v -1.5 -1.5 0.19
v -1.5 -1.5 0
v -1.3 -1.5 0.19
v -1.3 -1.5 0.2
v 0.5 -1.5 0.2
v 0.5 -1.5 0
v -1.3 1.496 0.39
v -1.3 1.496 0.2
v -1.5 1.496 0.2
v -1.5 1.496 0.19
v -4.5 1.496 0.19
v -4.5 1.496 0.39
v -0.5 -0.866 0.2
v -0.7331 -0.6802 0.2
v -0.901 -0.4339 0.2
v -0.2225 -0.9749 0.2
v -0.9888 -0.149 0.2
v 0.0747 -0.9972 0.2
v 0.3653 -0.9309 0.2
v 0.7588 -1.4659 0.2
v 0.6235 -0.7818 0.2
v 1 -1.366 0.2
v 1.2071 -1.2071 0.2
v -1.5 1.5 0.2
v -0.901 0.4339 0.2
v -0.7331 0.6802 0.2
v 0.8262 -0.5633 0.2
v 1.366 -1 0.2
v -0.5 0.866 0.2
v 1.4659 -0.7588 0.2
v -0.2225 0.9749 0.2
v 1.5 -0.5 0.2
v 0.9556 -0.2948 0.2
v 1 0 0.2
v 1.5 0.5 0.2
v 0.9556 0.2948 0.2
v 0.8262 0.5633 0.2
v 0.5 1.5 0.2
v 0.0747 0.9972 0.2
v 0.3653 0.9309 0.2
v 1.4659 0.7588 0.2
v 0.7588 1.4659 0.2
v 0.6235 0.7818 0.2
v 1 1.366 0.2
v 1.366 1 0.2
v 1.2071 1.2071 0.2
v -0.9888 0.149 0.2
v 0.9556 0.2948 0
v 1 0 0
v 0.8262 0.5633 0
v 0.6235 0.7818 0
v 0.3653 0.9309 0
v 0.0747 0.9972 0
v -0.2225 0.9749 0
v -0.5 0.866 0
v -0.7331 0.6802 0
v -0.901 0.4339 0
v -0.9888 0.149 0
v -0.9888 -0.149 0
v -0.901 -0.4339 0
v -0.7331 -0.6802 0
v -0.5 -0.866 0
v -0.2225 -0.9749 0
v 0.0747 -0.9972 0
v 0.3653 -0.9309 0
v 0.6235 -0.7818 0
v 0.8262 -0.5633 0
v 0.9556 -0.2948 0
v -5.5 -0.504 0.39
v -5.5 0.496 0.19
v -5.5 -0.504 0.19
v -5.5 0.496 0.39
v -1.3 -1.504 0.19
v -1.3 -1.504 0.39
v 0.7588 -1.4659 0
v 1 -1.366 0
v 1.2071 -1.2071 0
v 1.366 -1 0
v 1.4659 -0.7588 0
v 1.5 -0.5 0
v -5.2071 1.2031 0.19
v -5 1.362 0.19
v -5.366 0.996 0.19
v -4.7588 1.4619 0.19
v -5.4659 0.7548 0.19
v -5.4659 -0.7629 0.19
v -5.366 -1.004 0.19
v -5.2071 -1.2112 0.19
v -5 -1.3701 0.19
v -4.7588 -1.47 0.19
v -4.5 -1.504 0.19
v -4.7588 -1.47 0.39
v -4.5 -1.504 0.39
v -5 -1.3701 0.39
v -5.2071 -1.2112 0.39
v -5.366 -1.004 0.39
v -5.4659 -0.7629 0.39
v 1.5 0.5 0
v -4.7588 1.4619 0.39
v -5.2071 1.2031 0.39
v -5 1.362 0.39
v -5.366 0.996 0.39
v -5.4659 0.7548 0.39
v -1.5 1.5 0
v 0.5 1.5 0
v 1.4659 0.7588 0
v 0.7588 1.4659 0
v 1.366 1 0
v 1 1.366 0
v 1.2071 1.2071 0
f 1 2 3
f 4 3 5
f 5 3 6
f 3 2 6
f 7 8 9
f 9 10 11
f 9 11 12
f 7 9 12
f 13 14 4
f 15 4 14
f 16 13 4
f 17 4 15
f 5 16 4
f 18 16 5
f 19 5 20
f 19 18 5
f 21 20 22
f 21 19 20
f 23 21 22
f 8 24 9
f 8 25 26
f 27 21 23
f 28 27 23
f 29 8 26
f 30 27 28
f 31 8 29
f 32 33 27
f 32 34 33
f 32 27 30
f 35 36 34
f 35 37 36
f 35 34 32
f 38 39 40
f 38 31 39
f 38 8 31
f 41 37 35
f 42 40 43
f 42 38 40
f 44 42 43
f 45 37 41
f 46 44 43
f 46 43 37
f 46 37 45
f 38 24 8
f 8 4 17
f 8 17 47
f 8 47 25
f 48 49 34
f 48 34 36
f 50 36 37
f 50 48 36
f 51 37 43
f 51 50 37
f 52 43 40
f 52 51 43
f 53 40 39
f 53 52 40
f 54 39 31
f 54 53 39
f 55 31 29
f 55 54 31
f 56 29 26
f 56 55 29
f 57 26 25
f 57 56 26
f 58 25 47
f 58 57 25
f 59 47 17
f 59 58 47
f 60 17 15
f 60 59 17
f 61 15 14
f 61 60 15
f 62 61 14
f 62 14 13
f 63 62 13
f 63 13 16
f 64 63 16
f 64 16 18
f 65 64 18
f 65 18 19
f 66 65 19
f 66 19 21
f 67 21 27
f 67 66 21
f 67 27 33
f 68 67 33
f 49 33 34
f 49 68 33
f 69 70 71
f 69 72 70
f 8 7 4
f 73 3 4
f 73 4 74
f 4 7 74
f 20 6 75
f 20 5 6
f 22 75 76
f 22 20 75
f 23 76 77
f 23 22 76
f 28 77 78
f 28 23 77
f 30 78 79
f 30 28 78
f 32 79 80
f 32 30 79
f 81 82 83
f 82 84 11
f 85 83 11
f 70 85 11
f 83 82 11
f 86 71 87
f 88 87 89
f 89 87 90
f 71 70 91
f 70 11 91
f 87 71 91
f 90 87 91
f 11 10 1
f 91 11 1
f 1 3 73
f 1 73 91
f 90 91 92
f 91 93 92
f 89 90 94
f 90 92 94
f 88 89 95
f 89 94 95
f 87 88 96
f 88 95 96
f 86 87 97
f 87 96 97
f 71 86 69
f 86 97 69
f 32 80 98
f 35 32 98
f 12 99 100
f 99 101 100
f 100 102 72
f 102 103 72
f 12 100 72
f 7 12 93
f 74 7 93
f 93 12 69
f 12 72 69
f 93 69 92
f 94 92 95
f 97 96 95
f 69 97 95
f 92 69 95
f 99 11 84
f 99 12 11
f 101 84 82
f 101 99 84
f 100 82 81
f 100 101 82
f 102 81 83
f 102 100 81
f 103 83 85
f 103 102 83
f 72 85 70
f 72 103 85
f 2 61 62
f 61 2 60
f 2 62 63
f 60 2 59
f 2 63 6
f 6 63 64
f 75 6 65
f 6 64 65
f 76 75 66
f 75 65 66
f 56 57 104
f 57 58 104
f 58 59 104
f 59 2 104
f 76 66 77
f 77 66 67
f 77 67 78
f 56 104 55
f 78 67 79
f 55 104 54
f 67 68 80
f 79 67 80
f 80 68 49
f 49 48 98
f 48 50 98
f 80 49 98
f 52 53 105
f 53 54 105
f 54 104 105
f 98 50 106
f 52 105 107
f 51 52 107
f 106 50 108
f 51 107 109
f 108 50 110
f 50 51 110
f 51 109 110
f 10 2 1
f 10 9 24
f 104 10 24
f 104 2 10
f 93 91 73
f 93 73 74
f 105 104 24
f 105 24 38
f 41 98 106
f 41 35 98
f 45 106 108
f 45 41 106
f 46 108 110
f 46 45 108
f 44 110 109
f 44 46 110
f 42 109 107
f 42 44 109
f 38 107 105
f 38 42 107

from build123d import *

# Parameters (mm, degrees)
SKETCH_W          = 3
SKETCH_H          = 3
SKETCH_R          = 1
PAD_DEPTH         = 0.2
SKETCH001_W       = 3
SKETCH001_H       = 0.2
PAD001_DEPTH      = 4
PAD001_DEPTH_BACK = 0.2
FILLET_R          = 1


with BuildPart() as part:
    # Sketch → Pad (new body)
    with BuildSketch(Plane.XY):
        Rectangle(SKETCH_W, SKETCH_H)
        Circle(SKETCH_R, mode=Mode.SUBTRACT)
    extrude(amount=PAD_DEPTH)

    # Sketch001 (on Face4 of Pad) → Pad001 (join, two sides)
    with BuildSketch(Plane(origin=(-1.5, 0, 0), x_dir=(0, -1, 0), z_dir=(-1, 0, 0))) as pad001_sk:
        with Locations((0.004044, 0.29)):
            Rectangle(SKETCH001_W, SKETCH001_H)
    extrude(amount=PAD001_DEPTH)
    extrude(pad001_sk.sketch, amount=-PAD001_DEPTH_BACK)

    # Fillet
    fillet_edges = [part.edges().sort_by_distance(p)[0] for p in [
        (1.5, -1.5, 0.1),
        (1.5, 1.5, 0.1),
        (-5.5, -1.504044, 0.29),
        (-5.5, 1.495956, 0.29),
    ]]
    fillet(fillet_edges, radius=FILLET_R)


solid = part.part
